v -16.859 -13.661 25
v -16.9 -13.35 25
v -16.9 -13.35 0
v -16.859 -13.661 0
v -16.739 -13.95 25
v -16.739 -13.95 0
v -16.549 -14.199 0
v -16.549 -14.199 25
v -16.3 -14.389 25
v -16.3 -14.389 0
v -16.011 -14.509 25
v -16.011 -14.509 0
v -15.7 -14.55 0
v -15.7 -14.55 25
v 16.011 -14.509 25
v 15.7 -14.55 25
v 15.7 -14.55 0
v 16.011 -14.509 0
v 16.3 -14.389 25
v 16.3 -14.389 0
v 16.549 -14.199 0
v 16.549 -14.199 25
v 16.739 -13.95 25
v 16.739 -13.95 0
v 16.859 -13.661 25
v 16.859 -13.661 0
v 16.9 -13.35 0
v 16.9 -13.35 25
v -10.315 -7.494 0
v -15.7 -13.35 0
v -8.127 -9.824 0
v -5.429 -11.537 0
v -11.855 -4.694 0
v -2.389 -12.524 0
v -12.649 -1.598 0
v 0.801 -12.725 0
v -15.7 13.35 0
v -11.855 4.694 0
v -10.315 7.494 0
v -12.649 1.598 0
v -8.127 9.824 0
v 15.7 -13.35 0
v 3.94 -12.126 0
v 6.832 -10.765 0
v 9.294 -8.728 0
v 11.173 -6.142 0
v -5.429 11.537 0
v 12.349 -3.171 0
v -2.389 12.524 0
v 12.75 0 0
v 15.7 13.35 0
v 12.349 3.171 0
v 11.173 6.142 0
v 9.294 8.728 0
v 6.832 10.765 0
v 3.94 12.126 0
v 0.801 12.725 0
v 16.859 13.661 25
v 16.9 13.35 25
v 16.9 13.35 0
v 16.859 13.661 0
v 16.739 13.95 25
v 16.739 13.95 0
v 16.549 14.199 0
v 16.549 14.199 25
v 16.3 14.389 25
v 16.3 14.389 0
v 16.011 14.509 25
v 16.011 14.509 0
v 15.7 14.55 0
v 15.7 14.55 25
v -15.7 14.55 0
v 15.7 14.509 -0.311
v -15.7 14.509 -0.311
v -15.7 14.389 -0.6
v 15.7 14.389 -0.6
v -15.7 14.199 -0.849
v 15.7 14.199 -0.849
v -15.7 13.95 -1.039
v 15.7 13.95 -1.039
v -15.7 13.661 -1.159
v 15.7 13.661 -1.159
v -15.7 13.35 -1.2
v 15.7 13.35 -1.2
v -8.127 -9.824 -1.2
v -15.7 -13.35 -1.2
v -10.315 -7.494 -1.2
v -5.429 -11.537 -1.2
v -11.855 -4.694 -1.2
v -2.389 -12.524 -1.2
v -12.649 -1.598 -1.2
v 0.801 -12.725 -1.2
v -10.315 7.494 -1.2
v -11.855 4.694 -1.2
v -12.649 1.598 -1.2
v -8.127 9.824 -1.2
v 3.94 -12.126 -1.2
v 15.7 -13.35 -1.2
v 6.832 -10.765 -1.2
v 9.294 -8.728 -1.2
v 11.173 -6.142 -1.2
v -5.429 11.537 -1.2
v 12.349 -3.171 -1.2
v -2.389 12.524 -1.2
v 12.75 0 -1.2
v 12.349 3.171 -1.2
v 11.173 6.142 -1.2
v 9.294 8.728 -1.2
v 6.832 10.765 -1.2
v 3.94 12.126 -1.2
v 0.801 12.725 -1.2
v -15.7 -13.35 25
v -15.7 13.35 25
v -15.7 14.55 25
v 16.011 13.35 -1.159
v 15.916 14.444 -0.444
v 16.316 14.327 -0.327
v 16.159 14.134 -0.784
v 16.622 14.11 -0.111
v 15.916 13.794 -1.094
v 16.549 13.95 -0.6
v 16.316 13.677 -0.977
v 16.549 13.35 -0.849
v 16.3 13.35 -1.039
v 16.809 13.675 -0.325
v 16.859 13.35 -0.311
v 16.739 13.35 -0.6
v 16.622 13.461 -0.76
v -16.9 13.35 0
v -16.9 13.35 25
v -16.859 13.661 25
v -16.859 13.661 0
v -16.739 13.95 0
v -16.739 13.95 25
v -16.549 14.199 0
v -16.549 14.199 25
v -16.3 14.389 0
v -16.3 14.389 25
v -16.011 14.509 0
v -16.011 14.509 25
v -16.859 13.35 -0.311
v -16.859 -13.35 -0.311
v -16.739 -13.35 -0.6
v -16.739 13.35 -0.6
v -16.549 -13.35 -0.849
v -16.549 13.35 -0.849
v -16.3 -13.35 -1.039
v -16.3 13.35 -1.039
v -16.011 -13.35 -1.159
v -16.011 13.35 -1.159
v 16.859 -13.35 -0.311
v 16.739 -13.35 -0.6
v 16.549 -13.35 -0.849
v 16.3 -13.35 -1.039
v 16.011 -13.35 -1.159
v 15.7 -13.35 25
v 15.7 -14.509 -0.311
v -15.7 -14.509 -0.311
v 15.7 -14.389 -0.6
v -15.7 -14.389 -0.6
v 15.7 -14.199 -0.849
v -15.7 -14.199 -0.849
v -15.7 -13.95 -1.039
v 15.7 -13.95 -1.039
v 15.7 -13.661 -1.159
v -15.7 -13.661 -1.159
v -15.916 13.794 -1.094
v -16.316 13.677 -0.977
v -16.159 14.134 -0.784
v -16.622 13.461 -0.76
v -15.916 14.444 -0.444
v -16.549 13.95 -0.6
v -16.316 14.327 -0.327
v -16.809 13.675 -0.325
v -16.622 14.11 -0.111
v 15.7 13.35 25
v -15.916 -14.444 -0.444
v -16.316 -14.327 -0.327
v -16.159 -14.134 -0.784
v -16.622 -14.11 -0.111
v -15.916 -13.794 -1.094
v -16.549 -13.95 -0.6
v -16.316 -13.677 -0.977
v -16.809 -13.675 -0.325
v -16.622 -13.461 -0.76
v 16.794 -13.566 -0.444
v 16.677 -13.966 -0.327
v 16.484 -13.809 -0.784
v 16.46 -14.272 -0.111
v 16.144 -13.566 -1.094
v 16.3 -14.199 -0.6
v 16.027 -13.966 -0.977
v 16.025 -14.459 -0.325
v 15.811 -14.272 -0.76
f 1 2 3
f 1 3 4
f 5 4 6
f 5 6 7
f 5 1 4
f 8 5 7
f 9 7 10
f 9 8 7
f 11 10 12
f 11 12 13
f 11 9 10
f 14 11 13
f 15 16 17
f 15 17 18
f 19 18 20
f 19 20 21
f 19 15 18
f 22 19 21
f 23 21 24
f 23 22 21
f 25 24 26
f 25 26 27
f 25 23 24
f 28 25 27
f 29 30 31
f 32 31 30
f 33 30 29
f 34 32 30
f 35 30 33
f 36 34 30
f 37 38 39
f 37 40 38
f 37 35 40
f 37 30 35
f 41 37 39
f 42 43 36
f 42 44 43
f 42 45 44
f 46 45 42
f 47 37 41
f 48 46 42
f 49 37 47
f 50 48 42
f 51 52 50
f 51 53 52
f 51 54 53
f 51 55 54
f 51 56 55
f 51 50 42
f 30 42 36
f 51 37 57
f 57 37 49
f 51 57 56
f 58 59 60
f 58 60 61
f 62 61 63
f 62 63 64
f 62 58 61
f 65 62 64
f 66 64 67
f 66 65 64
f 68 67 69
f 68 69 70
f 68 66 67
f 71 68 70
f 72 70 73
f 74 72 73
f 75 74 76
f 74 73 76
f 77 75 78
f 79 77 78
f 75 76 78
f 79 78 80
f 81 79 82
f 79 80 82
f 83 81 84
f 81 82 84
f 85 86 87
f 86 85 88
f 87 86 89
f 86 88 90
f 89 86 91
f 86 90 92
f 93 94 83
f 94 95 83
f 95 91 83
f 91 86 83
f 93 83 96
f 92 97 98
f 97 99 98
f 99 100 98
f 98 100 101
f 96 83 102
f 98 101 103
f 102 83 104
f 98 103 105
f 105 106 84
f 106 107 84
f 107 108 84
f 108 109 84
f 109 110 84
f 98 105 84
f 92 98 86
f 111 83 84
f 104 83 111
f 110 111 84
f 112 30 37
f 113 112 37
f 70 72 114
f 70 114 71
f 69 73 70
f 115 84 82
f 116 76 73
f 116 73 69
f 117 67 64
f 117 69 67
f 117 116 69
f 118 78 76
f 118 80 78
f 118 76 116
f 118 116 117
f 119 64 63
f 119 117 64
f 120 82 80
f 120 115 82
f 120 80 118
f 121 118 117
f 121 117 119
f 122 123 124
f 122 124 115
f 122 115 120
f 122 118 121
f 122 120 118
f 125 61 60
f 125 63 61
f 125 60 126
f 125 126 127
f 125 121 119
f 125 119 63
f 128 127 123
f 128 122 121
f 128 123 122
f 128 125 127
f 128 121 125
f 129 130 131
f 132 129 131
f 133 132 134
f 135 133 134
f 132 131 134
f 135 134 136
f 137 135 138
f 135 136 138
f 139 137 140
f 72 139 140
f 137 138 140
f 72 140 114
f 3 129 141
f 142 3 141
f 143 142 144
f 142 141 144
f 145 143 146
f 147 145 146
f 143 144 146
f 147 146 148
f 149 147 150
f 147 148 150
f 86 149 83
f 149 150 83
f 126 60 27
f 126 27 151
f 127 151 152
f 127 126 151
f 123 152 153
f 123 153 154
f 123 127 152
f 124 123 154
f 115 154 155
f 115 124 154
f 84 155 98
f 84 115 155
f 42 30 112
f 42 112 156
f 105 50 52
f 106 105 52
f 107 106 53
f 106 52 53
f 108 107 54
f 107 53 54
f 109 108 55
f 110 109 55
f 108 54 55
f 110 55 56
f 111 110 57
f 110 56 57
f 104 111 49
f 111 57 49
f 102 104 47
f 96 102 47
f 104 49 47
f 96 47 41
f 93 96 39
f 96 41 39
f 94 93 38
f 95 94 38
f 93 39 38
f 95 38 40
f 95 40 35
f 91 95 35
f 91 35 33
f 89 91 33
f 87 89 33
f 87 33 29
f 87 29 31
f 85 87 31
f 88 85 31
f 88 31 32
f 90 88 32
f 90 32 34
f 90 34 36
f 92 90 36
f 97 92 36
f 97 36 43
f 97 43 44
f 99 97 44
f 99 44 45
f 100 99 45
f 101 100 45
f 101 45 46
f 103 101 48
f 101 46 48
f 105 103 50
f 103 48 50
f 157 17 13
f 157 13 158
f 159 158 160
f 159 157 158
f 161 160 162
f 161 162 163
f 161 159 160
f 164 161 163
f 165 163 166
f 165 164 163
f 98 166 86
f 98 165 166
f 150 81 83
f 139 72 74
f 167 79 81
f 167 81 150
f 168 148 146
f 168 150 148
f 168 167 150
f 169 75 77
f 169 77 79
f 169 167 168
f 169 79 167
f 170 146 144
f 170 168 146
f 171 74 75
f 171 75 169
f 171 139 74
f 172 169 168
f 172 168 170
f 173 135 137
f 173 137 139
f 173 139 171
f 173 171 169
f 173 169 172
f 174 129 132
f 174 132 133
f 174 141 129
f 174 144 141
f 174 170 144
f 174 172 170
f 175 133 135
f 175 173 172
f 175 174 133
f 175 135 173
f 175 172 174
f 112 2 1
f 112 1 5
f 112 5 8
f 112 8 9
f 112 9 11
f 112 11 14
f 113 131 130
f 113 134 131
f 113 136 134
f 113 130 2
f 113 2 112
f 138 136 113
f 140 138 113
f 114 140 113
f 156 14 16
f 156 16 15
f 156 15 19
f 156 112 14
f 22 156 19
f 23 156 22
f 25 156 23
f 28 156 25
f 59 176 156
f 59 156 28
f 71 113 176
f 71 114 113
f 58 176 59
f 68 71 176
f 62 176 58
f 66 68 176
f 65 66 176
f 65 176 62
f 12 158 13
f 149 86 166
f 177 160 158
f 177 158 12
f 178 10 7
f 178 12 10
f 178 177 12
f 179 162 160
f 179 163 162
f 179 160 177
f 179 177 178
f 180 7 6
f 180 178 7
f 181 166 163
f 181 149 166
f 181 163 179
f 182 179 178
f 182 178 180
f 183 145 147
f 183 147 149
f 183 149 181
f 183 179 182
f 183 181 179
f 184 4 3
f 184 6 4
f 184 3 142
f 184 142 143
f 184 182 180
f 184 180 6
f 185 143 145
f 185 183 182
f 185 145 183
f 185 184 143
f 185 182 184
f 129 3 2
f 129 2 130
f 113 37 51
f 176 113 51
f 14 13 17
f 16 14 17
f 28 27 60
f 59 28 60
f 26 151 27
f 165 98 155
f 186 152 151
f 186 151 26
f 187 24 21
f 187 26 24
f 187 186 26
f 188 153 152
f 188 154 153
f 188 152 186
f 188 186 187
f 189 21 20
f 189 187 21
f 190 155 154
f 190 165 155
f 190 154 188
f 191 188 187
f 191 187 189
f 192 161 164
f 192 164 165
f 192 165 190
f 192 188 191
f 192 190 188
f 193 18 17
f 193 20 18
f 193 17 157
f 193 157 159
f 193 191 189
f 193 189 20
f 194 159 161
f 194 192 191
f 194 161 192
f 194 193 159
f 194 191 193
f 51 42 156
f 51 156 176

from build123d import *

# Parameters (mm, degrees)
SKETCH_W    = 31.4
SKETCH_H    = 26.7
PAD_DEPTH   = 25
THICKNESS_T = 1.2
SKETCH001_R = 12.75
HOLE_DEPTH  = 25


with BuildPart() as part:
    # Sketch → Pad (new body)
    with BuildSketch(Plane.XY):
        Rectangle(SKETCH_W, SKETCH_H)
    extrude(amount=PAD_DEPTH)

    # Thickness
    thickness_openings = [part.faces().sort_by_distance(p)[0] for p in [
        (0, 0, 25),
    ]]
    offset(amount=THICKNESS_T, openings=thickness_openings)

    # Sketch001 (on Face5 of Thickness) → Hole (cut)
    with BuildSketch(Plane.XY):
        Circle(SKETCH001_R)
    extrude(amount=-HOLE_DEPTH, mode=Mode.SUBTRACT)


solid = part.part
